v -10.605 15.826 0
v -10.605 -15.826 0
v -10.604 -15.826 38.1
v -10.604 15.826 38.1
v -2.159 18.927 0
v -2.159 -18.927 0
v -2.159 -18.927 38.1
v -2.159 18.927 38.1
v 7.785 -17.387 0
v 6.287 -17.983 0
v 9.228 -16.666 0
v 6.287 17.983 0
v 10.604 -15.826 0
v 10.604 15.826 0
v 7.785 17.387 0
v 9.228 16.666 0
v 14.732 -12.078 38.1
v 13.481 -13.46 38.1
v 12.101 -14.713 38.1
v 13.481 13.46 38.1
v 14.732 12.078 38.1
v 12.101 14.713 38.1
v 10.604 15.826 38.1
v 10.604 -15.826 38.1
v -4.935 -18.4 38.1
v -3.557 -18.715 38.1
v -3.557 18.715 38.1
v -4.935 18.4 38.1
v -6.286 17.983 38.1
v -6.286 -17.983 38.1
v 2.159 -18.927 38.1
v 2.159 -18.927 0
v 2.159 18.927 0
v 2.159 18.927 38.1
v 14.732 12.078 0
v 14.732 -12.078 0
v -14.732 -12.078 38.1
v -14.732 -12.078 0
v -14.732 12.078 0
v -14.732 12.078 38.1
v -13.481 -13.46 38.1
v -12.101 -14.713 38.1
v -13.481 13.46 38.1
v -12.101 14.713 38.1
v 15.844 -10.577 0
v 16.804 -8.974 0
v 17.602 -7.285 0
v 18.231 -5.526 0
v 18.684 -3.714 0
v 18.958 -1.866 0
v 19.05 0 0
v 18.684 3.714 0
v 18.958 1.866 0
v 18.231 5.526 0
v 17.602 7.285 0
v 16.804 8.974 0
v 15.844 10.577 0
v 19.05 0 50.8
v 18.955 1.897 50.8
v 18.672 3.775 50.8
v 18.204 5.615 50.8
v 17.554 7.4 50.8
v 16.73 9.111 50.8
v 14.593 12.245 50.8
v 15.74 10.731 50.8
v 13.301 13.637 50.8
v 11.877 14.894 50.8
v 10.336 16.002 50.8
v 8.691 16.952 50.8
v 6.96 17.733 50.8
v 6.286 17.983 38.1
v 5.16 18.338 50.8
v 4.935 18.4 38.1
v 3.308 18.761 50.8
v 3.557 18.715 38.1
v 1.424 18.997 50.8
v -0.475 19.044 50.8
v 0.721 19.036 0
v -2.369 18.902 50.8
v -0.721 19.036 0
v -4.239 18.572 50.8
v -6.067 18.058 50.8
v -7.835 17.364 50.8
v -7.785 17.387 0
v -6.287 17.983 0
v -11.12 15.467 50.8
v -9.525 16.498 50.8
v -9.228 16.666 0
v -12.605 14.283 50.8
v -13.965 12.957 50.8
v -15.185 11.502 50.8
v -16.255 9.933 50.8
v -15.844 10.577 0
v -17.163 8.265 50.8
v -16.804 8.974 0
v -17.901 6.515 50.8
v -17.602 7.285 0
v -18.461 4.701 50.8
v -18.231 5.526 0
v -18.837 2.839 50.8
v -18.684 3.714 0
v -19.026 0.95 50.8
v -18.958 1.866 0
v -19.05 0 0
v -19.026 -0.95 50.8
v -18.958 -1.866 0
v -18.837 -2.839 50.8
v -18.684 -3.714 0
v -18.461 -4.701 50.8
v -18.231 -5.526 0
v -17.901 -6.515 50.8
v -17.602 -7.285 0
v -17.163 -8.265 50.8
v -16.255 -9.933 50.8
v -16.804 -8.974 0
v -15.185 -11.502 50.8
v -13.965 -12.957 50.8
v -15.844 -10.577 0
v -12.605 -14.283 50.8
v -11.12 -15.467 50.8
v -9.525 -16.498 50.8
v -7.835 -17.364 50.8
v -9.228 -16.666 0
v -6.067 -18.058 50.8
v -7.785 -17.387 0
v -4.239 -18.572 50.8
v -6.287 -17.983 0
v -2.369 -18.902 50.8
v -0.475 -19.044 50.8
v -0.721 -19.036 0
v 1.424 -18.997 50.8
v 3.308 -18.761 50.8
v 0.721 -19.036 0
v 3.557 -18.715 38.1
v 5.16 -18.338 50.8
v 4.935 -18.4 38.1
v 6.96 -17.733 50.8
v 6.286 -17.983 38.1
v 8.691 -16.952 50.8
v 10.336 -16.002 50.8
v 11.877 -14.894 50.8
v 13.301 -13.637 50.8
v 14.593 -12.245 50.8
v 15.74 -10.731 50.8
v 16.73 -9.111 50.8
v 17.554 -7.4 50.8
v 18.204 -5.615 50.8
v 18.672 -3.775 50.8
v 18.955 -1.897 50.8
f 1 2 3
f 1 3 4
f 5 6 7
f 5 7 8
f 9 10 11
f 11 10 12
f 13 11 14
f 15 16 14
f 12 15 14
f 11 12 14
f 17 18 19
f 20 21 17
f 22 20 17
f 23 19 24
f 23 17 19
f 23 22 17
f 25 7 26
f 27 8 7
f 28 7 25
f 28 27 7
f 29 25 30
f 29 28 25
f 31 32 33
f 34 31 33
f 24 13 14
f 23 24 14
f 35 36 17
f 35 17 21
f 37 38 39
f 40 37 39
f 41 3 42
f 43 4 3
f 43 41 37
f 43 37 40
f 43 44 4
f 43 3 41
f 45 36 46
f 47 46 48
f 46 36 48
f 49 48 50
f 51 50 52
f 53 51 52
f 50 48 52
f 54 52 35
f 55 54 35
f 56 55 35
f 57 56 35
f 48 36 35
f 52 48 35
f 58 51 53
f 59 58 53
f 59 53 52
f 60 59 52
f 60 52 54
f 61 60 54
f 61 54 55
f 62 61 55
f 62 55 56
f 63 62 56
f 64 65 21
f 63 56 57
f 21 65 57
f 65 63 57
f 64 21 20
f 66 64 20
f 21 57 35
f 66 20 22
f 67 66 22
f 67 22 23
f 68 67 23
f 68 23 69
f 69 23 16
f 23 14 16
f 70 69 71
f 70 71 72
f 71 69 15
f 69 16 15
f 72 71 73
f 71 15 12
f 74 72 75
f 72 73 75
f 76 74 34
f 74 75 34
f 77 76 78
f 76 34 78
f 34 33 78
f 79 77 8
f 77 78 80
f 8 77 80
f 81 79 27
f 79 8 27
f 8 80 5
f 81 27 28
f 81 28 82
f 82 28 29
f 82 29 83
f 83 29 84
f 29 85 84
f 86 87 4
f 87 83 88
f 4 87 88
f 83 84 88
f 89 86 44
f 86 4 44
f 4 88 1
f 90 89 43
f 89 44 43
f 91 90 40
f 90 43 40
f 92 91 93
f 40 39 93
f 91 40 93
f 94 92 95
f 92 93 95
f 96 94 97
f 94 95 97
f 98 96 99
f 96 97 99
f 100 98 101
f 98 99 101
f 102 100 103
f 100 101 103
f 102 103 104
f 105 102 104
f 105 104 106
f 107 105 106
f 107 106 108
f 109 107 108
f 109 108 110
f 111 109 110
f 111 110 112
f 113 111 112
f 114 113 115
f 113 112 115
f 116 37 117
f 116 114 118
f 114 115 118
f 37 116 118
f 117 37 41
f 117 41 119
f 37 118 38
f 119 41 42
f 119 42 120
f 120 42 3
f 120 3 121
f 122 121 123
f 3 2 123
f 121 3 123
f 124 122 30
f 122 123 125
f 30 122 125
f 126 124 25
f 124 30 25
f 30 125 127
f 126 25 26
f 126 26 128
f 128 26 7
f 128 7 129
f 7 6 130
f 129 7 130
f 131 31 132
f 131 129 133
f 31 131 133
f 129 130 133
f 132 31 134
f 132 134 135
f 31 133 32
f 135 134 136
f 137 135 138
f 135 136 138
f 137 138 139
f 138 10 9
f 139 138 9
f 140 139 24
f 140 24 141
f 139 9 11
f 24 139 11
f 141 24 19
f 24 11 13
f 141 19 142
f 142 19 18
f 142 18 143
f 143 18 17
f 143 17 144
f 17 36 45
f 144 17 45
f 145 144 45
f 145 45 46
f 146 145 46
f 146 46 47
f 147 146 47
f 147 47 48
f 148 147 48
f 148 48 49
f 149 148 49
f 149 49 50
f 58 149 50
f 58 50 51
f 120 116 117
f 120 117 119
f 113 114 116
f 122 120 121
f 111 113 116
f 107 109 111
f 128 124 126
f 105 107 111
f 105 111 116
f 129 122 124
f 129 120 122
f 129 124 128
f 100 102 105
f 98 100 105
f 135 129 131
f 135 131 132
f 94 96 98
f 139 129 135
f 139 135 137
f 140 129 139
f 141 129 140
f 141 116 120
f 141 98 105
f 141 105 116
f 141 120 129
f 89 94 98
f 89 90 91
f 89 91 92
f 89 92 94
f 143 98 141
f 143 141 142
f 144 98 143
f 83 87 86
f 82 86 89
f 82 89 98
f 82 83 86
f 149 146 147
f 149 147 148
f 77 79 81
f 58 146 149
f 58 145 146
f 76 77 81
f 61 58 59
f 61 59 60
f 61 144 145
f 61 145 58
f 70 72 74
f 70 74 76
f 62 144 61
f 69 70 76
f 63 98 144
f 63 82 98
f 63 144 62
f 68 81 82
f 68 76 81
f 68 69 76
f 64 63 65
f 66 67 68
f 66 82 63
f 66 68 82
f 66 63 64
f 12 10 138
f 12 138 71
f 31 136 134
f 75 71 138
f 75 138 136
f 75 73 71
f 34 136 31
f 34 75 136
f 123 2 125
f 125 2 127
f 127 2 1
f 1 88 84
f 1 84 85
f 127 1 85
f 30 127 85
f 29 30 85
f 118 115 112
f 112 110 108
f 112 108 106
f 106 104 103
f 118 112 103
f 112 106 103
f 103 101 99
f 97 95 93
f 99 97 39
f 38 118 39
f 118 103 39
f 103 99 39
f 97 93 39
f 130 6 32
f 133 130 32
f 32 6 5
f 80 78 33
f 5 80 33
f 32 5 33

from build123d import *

# Parameters (mm, degrees)
ESQUISSE1_R             = 19.05
BOSS_EXTRU_1_DEPTH      = 50.8
ESQUISSE6_W             = 4.1275
ESQUISSE6_H             = 38.1
ENL_V_MAT_EXTRU_1_DEPTH = 38.1
ESQUISSE7_W             = 4.1275
ESQUISSE7_H             = 38.1
ENL_V_MAT_EXTRU_2_DEPTH = 38.1


with BuildPart() as part:
    # Esquisse1 → Boss.-Extru.1 (new body)
    with BuildSketch(Plane.XY):
        Circle(ESQUISSE1_R)
    extrude(amount=BOSS_EXTRU_1_DEPTH)

    # Esquisse6 → Enlèv. mat.-Extru.1 (cut)
    with BuildSketch(Plane(origin=(0, 0, 0), x_dir=(-1, 0, 0), z_dir=(0, 0, -1))):
        with Locations((4.22275, 0)):
            Rectangle(ESQUISSE6_W, ESQUISSE6_H)
    extrude(amount=-ENL_V_MAT_EXTRU_1_DEPTH, mode=Mode.SUBTRACT)

    # Esquisse7 → Enlèv. mat.-Extru.2 (cut)
    with BuildSketch(Plane(origin=(0, 0, 0), x_dir=(-1, 0, 0), z_dir=(0, 0, -1))):
        with Locations((-4.22275, 0)):
            Rectangle(ESQUISSE7_W, ESQUISSE7_H)
        with Locations((-12.66825, 0)):
            Rectangle(ESQUISSE7_W, ESQUISSE7_H)
        with Locations((12.66825, 0)):
            Rectangle(ESQUISSE7_W, ESQUISSE7_H)
    extrude(amount=-ENL_V_MAT_EXTRU_2_DEPTH, mode=Mode.SUBTRACT)


solid = part.part
